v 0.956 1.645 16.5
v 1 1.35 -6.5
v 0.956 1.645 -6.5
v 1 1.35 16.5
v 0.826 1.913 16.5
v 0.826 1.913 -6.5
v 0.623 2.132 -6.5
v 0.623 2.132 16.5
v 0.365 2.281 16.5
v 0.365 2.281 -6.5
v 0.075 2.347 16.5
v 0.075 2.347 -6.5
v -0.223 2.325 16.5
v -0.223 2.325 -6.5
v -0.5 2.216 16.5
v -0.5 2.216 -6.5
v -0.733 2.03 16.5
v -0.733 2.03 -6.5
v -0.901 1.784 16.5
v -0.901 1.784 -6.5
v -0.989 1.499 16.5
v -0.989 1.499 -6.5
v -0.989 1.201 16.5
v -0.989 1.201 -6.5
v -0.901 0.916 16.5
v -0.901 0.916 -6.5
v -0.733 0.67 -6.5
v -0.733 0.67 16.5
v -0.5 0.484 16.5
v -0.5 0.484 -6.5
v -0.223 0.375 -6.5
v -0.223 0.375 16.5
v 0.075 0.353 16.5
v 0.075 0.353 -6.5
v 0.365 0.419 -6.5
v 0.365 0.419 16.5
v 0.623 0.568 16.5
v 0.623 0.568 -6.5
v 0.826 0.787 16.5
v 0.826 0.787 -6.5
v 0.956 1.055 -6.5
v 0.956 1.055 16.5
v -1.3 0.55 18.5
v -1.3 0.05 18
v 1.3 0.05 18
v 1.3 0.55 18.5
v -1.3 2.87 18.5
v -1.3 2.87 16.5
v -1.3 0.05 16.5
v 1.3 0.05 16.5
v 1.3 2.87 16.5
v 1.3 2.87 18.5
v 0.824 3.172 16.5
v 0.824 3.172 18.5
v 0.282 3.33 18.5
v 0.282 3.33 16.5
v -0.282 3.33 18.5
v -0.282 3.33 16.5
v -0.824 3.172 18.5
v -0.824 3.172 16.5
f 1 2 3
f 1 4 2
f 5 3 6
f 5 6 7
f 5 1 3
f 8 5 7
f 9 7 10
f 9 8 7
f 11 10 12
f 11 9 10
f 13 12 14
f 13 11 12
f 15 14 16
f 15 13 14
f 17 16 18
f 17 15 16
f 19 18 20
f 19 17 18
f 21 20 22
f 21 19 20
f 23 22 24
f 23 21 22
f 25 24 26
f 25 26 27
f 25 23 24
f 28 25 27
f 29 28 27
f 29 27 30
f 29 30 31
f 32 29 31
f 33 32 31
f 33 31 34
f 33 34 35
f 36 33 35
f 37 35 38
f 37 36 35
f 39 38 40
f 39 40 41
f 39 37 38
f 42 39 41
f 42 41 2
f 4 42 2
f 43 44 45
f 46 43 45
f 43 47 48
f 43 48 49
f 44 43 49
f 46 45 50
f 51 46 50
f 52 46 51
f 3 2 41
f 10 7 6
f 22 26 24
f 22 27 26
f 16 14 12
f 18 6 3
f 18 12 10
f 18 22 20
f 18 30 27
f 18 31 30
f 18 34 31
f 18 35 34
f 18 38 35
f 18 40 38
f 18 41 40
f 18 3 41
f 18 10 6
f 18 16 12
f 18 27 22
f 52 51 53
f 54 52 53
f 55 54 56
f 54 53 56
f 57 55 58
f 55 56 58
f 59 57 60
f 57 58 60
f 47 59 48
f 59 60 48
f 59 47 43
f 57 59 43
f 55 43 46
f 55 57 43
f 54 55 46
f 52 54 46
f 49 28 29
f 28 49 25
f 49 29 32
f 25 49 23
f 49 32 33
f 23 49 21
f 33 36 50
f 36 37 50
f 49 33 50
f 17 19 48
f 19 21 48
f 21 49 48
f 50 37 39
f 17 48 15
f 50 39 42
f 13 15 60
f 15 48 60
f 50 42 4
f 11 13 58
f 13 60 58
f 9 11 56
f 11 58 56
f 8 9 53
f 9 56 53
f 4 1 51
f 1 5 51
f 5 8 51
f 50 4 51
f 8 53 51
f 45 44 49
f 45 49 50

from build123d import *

# Parameters (mm, degrees)
ESQUISSE2_R             = 1
BOSS_EXTRU_1_DEPTH      = 16.5
BOSS_EXTRU_1_DEPTH_BACK = 11
ESQUISSE3_R             = 2
BOSS_EXTRU_2_DEPTH      = 2
ESQUISSE4_OUTSIDE_W     = 12.008
ESQUISSE4_OUTSIDE_H     = 12.008
ENL_V_MAT_EXTRU_1_DEPTH = 30.5
CHANFREIN1_SIZE         = 0.5
ESQUISSE6_R             = 1
ENL_V_MAT_EXTRU_2_DEPTH = 4.5


with BuildPart() as part:
    # Esquisse2 → Boss.-Extru.1 (new body, two sides)
    with BuildSketch(Plane.XY) as boss_extru_1_sk:
        with Locations((0, 1.35)):
            Circle(ESQUISSE2_R)
    extrude(amount=BOSS_EXTRU_1_DEPTH)
    extrude(boss_extru_1_sk.sketch, amount=-BOSS_EXTRU_1_DEPTH_BACK)

    # Esquisse3 → Boss.-Extru.2 (add)
    with BuildSketch(Plane.XY.offset(16.5)):
        with Locations((0, 1.35)):
            Circle(ESQUISSE3_R)
    extrude(amount=BOSS_EXTRU_2_DEPTH)

    # Esquisse4 outside → Enlèv. mat.-Extru.1 (cut, through all)
    with BuildSketch(Plane.XY.offset(18.5)):
        with Locations((0, 1.35)):
            Rectangle(ESQUISSE4_OUTSIDE_W, ESQUISSE4_OUTSIDE_H)
        with BuildLine():
            Line((-1.3, 2.869868415), (-1.3, 0.05))
            Line((-1.3, 0.05), (1.3, 0.05))
            Line((1.3, 0.05), (1.3, 2.869868415))
            ThreePointArc((1.3, 2.869868415), (0, 3.35), (-1.3, 2.869868415))
        make_face(mode=Mode.SUBTRACT)
    extrude(amount=-ENL_V_MAT_EXTRU_1_DEPTH, mode=Mode.SUBTRACT)

    # Chanfrein1
    chanfrein1_edges = [part.edges().sort_by_distance(p)[0] for p in [
        (0, 0.05, 18.5),
    ]]
    chamfer(chanfrein1_edges, length=CHANFREIN1_SIZE)

    # Esquisse6 → Enlèv. mat.-Extru.2 (cut)
    with BuildSketch(Plane(origin=(0, 0, -11), x_dir=(-1, 0, 0), z_dir=(0, 0, -1))):
        with Locations((0, 1.35)):
            Circle(ESQUISSE6_R)
    extrude(amount=-ENL_V_MAT_EXTRU_2_DEPTH, mode=Mode.SUBTRACT)


solid = part.part
